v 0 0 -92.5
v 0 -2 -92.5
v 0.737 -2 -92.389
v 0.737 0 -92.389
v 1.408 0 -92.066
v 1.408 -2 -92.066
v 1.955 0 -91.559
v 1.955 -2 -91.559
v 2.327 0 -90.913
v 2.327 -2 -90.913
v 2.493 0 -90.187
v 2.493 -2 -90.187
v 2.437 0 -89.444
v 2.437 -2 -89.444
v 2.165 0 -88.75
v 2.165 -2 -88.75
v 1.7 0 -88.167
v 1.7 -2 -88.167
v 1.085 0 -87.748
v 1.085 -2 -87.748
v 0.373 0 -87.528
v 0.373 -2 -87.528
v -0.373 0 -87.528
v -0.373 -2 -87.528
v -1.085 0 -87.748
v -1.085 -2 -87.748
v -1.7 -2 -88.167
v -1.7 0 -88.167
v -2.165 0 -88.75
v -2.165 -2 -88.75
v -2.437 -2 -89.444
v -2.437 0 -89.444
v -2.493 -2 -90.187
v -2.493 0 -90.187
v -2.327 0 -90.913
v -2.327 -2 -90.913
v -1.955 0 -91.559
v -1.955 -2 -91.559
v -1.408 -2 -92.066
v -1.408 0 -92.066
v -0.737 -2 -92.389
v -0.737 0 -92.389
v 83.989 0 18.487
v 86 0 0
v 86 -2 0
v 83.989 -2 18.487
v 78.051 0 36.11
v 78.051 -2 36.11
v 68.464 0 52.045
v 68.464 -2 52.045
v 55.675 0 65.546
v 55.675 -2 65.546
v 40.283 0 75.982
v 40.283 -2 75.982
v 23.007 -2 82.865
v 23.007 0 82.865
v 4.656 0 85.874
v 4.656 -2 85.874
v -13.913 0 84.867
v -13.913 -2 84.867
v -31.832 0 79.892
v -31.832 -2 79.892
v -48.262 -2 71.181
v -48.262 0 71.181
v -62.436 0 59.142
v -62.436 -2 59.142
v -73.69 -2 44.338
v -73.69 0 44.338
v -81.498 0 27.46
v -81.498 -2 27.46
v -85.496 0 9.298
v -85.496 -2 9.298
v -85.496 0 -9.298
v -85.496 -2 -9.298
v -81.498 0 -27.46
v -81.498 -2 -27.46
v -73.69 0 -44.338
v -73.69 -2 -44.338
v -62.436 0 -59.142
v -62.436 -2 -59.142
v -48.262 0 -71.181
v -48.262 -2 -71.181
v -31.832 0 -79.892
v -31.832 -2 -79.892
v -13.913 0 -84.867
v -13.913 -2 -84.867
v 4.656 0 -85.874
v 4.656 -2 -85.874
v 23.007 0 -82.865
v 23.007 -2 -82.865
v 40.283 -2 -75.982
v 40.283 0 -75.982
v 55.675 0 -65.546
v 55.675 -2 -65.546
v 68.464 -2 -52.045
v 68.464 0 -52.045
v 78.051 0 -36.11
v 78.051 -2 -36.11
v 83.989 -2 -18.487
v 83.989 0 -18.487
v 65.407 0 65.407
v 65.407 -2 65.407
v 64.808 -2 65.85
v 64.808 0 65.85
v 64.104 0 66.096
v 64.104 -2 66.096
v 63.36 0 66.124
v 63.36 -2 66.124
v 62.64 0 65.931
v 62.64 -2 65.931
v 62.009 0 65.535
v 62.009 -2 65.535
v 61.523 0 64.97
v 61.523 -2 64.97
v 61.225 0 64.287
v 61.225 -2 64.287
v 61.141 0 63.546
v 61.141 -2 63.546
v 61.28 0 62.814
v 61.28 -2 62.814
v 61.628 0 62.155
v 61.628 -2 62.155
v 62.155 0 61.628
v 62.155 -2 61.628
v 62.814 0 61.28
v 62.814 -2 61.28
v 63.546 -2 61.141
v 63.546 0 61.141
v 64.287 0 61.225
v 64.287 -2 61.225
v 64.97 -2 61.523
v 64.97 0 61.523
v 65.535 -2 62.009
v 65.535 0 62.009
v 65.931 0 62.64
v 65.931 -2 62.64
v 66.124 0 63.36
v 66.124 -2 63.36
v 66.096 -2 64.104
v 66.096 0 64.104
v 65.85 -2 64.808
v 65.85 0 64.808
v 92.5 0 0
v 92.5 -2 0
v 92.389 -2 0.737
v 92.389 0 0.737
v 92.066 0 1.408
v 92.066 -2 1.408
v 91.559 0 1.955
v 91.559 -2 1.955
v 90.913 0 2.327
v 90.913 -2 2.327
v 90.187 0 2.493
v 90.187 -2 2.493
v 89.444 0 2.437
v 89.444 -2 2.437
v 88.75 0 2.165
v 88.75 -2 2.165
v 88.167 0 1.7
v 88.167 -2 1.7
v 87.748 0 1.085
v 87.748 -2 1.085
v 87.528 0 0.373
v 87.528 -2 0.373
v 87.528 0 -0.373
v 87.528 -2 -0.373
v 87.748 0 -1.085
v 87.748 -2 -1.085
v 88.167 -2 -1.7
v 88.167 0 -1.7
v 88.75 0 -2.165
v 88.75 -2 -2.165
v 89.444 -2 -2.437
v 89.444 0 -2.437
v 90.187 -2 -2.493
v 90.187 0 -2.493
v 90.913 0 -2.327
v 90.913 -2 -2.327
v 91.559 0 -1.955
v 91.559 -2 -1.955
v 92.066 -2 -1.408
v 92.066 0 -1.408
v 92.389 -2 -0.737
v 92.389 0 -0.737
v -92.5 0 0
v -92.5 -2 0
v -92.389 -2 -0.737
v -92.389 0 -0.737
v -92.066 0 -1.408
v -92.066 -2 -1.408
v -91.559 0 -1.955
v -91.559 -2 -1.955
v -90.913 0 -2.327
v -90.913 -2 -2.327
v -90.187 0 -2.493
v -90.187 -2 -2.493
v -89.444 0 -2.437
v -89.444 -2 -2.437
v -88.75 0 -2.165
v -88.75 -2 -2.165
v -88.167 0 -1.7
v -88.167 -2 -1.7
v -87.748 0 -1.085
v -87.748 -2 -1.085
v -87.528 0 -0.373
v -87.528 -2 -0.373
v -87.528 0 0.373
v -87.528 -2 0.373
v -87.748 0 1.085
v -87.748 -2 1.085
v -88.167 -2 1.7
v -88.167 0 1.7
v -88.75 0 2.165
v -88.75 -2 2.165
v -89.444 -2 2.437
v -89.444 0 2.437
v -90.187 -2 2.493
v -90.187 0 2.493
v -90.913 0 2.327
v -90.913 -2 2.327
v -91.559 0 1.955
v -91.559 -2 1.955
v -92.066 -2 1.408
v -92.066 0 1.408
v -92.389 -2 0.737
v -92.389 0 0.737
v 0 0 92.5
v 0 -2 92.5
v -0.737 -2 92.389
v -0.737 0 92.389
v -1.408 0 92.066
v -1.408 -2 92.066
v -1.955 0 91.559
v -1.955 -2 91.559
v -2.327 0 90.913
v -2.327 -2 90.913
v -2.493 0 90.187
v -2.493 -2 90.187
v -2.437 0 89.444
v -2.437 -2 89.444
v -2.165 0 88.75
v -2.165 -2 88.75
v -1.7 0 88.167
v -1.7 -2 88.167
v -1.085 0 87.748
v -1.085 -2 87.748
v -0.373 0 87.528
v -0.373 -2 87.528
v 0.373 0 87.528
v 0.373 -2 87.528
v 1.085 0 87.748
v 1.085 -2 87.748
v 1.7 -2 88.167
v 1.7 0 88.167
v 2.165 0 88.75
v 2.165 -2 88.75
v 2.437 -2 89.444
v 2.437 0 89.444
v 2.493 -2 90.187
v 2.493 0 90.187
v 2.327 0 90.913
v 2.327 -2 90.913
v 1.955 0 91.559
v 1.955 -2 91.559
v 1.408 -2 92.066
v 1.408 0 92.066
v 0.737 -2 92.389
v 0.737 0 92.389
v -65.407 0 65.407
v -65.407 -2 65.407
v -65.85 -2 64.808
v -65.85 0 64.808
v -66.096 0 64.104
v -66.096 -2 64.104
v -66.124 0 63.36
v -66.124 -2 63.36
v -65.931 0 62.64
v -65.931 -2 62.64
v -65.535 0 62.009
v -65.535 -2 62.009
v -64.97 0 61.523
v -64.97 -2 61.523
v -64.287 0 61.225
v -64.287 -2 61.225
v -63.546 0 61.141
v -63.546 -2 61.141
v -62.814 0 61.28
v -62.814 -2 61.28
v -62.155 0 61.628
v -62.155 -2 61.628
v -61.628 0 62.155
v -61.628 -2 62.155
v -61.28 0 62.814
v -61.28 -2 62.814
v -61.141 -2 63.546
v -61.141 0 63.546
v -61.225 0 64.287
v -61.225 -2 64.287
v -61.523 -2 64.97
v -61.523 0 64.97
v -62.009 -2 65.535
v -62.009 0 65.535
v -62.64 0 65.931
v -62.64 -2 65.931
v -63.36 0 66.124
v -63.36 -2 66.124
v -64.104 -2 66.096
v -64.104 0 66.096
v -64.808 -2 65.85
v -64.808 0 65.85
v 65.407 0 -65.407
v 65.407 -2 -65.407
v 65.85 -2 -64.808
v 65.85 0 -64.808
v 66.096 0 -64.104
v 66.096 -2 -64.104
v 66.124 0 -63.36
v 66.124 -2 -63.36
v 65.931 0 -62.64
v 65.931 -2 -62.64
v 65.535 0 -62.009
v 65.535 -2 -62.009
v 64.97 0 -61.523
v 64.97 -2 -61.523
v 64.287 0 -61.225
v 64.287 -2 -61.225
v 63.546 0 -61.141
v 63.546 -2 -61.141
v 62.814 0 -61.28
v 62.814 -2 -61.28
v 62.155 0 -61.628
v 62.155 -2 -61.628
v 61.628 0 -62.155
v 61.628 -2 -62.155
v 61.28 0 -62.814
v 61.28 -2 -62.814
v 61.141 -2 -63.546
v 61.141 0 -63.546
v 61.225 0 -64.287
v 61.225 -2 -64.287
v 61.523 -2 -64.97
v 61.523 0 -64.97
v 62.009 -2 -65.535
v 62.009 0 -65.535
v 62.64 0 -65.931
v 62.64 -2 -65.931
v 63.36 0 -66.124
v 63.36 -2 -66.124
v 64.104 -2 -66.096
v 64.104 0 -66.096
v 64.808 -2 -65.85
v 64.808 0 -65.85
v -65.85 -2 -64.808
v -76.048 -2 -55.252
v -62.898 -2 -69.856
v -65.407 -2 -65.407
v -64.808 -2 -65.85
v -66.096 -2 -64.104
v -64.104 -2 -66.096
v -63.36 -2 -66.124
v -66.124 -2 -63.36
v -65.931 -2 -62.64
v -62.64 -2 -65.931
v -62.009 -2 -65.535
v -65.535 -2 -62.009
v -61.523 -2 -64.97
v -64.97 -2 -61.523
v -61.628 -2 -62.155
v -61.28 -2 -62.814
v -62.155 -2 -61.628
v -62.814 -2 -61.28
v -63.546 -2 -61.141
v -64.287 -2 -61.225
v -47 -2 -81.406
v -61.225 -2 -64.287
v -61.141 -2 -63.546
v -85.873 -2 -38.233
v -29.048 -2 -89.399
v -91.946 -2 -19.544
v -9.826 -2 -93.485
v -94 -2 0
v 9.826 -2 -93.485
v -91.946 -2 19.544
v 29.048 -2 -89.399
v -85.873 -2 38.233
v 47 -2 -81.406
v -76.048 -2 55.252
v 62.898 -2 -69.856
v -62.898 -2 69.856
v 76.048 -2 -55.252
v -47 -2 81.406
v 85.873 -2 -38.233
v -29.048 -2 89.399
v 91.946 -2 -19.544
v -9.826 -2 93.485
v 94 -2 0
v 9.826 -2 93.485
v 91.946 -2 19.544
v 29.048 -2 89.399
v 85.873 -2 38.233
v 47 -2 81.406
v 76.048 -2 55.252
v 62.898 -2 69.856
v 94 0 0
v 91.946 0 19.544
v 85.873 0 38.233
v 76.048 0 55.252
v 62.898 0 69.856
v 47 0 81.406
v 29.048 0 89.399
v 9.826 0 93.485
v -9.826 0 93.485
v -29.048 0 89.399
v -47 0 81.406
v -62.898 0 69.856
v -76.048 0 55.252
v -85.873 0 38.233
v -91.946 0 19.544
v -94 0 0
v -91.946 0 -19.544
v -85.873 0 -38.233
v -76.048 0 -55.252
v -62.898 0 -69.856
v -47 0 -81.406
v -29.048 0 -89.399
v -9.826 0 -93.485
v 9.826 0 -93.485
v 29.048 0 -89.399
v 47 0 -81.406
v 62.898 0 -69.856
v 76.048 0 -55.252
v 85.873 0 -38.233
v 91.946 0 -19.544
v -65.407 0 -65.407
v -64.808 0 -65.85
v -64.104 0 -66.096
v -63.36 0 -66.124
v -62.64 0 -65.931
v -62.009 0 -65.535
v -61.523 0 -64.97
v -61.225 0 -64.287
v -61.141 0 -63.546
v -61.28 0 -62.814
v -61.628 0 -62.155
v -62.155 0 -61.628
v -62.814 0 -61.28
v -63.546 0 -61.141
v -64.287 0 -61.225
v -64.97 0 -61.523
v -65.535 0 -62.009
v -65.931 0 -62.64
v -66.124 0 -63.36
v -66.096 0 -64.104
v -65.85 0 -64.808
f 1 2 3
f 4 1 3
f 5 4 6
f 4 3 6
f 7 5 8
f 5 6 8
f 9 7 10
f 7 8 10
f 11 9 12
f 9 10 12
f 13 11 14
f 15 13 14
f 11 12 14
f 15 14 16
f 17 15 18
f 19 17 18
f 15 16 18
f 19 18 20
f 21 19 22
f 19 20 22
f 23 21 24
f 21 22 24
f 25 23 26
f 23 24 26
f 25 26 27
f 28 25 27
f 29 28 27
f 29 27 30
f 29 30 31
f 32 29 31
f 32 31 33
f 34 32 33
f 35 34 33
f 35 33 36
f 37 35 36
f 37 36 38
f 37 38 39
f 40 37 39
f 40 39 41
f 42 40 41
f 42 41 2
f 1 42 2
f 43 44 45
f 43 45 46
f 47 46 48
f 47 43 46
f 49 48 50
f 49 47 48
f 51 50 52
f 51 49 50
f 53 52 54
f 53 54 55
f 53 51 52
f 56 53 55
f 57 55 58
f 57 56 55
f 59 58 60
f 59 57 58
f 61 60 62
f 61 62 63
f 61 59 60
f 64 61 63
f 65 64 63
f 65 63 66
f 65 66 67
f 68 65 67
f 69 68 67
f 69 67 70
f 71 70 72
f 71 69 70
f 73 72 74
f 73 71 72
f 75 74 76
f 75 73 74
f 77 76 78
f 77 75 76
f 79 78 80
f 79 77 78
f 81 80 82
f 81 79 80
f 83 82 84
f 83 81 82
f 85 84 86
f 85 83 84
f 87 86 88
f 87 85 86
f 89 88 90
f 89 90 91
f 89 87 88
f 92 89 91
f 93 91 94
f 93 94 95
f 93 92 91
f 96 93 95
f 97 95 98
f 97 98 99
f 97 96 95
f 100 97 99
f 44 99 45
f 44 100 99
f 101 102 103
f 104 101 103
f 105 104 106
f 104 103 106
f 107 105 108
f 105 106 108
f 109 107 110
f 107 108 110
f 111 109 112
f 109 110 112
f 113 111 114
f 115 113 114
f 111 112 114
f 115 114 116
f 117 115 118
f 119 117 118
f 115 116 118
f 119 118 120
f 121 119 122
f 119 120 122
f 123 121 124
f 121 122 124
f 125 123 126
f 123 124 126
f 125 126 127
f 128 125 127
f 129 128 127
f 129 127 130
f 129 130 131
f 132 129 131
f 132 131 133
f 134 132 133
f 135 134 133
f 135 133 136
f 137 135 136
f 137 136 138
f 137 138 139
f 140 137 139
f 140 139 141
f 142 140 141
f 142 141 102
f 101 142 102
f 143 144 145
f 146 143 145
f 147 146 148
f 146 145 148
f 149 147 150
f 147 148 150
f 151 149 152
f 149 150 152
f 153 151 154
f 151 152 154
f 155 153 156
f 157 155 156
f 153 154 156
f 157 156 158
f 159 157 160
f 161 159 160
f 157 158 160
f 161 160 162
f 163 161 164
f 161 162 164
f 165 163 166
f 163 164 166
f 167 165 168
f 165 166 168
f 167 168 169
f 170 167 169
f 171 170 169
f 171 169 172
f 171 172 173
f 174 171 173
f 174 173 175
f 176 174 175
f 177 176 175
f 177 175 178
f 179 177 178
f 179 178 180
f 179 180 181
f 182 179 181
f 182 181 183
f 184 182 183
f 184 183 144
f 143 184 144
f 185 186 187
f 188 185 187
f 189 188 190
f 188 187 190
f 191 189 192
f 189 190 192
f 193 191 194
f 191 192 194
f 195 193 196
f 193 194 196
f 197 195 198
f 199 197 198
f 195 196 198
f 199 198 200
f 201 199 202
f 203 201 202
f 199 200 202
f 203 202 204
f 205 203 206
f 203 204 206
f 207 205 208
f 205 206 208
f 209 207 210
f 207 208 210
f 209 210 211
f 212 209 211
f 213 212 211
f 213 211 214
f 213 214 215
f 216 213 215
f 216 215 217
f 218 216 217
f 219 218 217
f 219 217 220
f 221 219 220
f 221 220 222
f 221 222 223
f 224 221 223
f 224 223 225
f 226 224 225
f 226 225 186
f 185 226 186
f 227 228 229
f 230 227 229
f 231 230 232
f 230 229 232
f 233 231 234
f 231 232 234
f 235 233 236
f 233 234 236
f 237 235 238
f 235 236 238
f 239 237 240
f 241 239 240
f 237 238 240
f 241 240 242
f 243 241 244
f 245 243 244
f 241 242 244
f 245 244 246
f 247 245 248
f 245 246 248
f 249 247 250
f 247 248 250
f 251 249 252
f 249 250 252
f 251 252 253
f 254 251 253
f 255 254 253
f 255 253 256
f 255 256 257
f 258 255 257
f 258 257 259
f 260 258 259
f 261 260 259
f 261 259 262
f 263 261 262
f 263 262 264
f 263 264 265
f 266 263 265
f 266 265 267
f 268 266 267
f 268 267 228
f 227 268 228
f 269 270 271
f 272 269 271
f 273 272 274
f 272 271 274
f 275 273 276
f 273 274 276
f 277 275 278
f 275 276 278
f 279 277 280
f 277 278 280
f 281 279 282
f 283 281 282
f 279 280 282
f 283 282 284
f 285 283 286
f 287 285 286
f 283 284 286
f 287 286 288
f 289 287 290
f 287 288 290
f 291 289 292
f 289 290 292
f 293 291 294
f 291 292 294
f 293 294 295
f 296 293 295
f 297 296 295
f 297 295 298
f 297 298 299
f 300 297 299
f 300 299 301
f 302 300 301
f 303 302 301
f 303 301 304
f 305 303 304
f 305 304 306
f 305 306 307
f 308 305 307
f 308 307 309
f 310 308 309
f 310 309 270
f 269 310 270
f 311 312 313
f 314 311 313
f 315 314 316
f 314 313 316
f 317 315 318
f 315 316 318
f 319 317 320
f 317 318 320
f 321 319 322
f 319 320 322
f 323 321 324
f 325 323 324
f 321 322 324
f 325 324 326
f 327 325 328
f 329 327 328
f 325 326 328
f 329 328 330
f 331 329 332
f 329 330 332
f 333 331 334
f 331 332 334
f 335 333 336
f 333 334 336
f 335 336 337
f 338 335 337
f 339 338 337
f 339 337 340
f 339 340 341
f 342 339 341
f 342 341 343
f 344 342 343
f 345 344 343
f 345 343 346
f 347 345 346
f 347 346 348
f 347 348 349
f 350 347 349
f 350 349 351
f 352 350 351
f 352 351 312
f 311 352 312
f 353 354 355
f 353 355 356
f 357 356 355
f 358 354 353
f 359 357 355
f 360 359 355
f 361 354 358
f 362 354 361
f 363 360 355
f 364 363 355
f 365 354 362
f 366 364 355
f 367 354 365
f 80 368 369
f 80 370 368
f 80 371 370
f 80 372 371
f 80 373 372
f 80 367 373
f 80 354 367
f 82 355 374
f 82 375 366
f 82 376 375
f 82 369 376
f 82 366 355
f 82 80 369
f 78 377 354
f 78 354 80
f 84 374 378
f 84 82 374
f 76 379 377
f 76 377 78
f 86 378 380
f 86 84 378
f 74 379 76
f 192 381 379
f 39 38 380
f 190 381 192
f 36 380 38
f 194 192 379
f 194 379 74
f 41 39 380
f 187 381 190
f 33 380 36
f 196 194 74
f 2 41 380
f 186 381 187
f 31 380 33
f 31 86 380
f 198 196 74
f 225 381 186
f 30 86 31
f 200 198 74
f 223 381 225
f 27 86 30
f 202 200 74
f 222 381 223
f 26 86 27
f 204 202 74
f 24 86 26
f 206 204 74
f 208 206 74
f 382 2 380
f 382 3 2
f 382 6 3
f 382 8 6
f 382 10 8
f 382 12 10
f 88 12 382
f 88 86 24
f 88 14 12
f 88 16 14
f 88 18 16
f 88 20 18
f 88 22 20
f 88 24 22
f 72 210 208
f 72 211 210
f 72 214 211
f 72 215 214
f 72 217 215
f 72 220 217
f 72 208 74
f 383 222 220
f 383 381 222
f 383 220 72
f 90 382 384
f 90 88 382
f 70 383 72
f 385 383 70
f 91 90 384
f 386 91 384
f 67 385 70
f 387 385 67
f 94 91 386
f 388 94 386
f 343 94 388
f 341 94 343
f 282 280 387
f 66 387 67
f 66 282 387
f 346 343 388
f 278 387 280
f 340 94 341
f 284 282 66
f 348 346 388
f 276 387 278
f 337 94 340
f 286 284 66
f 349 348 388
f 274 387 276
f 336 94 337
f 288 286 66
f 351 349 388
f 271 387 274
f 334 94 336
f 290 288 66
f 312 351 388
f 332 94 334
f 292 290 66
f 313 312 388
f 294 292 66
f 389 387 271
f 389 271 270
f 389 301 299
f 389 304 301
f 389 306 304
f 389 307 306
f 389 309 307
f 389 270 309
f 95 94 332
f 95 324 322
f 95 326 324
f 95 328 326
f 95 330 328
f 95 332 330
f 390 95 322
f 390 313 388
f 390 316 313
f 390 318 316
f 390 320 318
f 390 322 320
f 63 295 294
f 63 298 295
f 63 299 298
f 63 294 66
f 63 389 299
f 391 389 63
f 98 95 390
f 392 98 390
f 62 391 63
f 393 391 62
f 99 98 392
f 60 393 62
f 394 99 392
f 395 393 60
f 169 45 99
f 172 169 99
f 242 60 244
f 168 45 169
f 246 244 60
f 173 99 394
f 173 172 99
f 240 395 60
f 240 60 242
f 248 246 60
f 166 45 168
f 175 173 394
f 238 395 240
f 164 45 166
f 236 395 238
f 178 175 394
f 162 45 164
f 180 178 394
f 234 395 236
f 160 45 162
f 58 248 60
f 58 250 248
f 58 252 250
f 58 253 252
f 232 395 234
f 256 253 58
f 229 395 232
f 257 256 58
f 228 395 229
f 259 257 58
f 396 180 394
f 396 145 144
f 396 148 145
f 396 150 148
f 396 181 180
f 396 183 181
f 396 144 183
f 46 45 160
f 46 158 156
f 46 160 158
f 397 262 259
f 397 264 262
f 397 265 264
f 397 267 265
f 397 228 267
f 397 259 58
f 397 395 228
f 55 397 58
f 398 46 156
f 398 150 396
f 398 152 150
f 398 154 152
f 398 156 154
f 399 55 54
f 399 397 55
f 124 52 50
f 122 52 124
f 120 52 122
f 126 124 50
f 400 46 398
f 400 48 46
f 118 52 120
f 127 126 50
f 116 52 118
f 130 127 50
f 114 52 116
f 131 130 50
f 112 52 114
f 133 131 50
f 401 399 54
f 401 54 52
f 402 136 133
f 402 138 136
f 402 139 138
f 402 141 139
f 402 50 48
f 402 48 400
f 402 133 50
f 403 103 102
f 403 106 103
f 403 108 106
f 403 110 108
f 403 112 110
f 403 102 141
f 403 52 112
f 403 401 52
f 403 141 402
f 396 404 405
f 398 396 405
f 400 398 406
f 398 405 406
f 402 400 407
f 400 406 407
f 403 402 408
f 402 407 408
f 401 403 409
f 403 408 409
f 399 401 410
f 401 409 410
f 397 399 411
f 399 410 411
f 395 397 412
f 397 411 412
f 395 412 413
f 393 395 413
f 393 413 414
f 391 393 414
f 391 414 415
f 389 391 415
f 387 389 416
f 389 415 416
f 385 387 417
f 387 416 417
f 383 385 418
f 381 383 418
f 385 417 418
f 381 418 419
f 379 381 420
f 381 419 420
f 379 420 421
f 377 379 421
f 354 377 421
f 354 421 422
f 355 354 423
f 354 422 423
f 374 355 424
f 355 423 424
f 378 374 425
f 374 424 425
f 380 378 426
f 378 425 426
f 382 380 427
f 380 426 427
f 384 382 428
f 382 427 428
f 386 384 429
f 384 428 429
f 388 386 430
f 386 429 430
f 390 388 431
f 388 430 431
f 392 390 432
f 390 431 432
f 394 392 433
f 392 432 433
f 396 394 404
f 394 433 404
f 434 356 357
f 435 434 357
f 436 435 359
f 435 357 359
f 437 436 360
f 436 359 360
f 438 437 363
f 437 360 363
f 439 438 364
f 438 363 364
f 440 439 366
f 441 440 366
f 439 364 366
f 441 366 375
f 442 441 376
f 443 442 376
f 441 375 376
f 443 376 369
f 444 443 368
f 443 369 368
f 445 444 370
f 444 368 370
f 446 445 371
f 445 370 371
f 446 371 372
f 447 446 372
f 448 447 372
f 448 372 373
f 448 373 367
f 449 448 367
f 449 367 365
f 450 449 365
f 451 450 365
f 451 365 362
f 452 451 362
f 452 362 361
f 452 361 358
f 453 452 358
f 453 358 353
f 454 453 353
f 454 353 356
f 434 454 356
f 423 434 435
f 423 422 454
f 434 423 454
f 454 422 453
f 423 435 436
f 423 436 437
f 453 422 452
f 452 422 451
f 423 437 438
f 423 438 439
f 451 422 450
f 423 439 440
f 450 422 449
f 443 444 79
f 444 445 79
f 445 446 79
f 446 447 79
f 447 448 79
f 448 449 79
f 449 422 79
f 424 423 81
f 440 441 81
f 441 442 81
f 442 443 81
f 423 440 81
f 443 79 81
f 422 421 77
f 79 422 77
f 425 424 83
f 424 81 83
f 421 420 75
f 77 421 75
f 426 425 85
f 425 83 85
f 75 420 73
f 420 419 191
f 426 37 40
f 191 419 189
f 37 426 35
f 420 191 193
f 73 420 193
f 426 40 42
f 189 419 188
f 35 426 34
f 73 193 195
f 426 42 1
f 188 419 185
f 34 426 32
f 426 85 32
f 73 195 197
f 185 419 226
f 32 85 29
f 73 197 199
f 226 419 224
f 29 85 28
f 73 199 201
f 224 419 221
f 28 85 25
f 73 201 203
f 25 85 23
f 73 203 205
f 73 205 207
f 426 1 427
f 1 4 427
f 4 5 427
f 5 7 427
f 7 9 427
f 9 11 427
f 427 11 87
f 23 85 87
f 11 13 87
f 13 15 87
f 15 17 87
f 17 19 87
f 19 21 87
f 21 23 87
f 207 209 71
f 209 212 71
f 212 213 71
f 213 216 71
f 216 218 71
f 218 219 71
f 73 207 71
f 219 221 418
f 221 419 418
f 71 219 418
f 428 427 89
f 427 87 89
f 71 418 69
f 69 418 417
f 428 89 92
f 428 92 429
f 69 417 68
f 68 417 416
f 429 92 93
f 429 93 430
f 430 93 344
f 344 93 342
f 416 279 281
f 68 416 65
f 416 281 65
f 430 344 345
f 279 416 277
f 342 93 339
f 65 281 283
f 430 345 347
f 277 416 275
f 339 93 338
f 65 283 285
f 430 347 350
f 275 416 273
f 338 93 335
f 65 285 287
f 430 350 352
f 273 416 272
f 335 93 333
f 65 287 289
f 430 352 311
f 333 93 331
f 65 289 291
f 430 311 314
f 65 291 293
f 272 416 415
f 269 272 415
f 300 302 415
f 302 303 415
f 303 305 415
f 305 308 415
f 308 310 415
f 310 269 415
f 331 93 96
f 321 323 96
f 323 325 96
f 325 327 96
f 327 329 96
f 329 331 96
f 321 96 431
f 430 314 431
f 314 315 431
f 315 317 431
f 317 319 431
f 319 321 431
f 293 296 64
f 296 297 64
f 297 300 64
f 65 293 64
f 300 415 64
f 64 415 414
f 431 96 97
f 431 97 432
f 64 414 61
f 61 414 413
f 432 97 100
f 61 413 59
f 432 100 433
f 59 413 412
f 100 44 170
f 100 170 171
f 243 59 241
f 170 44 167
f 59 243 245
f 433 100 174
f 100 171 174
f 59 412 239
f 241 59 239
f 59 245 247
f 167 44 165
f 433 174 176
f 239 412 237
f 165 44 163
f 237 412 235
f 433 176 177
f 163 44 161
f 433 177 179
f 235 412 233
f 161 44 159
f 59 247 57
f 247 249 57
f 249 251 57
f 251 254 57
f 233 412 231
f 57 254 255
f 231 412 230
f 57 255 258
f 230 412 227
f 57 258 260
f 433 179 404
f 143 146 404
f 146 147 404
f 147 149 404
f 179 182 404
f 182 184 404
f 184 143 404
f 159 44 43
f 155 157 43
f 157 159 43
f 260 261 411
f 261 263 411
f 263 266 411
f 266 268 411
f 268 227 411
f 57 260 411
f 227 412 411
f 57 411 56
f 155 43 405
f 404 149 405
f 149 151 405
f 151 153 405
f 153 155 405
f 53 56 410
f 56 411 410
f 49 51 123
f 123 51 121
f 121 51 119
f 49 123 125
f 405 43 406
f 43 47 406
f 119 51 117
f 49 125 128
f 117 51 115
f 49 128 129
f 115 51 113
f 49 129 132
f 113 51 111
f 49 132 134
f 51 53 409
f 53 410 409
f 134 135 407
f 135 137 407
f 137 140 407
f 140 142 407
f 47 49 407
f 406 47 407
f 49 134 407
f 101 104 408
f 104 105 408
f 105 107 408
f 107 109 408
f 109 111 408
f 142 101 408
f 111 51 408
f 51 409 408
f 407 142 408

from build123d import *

# Parameters (mm, degrees)
SKETCH004_R        = 94
SKETCH004_R_2      = 86
PAD005_DEPTH       = 2
SKETCH005_R        = 2.5
POCKET001_DEPTH    = 5
POLARPATTERN_COUNT = 8


with BuildPart() as part:
    # Sketch004 (on ShapeBinder) → Pad005 (new body)
    with BuildSketch(Plane.XZ):
        Circle(SKETCH004_R)
        Circle(SKETCH004_R_2, mode=Mode.SUBTRACT)
    extrude(amount=PAD005_DEPTH)

    # Sketch005 (on Face4 of Pad005) → Pocket001 (cut)
    with BuildSketch(Plane.XZ.offset(2)):
        with Locations((90, 0)):
            Circle(SKETCH005_R)
    pocket001 = extrude(amount=-POCKET001_DEPTH, mode=Mode.SUBTRACT)

    # PolarPattern: Pocket001 ×8 about axis
    polarpattern_axis = Axis((0, -2, 0), (0, -1, 0))
    for i in range(1, POLARPATTERN_COUNT):
        add(pocket001.rotate(polarpattern_axis, i * 360 / POLARPATTERN_COUNT), mode=Mode.SUBTRACT)


solid = part.part
